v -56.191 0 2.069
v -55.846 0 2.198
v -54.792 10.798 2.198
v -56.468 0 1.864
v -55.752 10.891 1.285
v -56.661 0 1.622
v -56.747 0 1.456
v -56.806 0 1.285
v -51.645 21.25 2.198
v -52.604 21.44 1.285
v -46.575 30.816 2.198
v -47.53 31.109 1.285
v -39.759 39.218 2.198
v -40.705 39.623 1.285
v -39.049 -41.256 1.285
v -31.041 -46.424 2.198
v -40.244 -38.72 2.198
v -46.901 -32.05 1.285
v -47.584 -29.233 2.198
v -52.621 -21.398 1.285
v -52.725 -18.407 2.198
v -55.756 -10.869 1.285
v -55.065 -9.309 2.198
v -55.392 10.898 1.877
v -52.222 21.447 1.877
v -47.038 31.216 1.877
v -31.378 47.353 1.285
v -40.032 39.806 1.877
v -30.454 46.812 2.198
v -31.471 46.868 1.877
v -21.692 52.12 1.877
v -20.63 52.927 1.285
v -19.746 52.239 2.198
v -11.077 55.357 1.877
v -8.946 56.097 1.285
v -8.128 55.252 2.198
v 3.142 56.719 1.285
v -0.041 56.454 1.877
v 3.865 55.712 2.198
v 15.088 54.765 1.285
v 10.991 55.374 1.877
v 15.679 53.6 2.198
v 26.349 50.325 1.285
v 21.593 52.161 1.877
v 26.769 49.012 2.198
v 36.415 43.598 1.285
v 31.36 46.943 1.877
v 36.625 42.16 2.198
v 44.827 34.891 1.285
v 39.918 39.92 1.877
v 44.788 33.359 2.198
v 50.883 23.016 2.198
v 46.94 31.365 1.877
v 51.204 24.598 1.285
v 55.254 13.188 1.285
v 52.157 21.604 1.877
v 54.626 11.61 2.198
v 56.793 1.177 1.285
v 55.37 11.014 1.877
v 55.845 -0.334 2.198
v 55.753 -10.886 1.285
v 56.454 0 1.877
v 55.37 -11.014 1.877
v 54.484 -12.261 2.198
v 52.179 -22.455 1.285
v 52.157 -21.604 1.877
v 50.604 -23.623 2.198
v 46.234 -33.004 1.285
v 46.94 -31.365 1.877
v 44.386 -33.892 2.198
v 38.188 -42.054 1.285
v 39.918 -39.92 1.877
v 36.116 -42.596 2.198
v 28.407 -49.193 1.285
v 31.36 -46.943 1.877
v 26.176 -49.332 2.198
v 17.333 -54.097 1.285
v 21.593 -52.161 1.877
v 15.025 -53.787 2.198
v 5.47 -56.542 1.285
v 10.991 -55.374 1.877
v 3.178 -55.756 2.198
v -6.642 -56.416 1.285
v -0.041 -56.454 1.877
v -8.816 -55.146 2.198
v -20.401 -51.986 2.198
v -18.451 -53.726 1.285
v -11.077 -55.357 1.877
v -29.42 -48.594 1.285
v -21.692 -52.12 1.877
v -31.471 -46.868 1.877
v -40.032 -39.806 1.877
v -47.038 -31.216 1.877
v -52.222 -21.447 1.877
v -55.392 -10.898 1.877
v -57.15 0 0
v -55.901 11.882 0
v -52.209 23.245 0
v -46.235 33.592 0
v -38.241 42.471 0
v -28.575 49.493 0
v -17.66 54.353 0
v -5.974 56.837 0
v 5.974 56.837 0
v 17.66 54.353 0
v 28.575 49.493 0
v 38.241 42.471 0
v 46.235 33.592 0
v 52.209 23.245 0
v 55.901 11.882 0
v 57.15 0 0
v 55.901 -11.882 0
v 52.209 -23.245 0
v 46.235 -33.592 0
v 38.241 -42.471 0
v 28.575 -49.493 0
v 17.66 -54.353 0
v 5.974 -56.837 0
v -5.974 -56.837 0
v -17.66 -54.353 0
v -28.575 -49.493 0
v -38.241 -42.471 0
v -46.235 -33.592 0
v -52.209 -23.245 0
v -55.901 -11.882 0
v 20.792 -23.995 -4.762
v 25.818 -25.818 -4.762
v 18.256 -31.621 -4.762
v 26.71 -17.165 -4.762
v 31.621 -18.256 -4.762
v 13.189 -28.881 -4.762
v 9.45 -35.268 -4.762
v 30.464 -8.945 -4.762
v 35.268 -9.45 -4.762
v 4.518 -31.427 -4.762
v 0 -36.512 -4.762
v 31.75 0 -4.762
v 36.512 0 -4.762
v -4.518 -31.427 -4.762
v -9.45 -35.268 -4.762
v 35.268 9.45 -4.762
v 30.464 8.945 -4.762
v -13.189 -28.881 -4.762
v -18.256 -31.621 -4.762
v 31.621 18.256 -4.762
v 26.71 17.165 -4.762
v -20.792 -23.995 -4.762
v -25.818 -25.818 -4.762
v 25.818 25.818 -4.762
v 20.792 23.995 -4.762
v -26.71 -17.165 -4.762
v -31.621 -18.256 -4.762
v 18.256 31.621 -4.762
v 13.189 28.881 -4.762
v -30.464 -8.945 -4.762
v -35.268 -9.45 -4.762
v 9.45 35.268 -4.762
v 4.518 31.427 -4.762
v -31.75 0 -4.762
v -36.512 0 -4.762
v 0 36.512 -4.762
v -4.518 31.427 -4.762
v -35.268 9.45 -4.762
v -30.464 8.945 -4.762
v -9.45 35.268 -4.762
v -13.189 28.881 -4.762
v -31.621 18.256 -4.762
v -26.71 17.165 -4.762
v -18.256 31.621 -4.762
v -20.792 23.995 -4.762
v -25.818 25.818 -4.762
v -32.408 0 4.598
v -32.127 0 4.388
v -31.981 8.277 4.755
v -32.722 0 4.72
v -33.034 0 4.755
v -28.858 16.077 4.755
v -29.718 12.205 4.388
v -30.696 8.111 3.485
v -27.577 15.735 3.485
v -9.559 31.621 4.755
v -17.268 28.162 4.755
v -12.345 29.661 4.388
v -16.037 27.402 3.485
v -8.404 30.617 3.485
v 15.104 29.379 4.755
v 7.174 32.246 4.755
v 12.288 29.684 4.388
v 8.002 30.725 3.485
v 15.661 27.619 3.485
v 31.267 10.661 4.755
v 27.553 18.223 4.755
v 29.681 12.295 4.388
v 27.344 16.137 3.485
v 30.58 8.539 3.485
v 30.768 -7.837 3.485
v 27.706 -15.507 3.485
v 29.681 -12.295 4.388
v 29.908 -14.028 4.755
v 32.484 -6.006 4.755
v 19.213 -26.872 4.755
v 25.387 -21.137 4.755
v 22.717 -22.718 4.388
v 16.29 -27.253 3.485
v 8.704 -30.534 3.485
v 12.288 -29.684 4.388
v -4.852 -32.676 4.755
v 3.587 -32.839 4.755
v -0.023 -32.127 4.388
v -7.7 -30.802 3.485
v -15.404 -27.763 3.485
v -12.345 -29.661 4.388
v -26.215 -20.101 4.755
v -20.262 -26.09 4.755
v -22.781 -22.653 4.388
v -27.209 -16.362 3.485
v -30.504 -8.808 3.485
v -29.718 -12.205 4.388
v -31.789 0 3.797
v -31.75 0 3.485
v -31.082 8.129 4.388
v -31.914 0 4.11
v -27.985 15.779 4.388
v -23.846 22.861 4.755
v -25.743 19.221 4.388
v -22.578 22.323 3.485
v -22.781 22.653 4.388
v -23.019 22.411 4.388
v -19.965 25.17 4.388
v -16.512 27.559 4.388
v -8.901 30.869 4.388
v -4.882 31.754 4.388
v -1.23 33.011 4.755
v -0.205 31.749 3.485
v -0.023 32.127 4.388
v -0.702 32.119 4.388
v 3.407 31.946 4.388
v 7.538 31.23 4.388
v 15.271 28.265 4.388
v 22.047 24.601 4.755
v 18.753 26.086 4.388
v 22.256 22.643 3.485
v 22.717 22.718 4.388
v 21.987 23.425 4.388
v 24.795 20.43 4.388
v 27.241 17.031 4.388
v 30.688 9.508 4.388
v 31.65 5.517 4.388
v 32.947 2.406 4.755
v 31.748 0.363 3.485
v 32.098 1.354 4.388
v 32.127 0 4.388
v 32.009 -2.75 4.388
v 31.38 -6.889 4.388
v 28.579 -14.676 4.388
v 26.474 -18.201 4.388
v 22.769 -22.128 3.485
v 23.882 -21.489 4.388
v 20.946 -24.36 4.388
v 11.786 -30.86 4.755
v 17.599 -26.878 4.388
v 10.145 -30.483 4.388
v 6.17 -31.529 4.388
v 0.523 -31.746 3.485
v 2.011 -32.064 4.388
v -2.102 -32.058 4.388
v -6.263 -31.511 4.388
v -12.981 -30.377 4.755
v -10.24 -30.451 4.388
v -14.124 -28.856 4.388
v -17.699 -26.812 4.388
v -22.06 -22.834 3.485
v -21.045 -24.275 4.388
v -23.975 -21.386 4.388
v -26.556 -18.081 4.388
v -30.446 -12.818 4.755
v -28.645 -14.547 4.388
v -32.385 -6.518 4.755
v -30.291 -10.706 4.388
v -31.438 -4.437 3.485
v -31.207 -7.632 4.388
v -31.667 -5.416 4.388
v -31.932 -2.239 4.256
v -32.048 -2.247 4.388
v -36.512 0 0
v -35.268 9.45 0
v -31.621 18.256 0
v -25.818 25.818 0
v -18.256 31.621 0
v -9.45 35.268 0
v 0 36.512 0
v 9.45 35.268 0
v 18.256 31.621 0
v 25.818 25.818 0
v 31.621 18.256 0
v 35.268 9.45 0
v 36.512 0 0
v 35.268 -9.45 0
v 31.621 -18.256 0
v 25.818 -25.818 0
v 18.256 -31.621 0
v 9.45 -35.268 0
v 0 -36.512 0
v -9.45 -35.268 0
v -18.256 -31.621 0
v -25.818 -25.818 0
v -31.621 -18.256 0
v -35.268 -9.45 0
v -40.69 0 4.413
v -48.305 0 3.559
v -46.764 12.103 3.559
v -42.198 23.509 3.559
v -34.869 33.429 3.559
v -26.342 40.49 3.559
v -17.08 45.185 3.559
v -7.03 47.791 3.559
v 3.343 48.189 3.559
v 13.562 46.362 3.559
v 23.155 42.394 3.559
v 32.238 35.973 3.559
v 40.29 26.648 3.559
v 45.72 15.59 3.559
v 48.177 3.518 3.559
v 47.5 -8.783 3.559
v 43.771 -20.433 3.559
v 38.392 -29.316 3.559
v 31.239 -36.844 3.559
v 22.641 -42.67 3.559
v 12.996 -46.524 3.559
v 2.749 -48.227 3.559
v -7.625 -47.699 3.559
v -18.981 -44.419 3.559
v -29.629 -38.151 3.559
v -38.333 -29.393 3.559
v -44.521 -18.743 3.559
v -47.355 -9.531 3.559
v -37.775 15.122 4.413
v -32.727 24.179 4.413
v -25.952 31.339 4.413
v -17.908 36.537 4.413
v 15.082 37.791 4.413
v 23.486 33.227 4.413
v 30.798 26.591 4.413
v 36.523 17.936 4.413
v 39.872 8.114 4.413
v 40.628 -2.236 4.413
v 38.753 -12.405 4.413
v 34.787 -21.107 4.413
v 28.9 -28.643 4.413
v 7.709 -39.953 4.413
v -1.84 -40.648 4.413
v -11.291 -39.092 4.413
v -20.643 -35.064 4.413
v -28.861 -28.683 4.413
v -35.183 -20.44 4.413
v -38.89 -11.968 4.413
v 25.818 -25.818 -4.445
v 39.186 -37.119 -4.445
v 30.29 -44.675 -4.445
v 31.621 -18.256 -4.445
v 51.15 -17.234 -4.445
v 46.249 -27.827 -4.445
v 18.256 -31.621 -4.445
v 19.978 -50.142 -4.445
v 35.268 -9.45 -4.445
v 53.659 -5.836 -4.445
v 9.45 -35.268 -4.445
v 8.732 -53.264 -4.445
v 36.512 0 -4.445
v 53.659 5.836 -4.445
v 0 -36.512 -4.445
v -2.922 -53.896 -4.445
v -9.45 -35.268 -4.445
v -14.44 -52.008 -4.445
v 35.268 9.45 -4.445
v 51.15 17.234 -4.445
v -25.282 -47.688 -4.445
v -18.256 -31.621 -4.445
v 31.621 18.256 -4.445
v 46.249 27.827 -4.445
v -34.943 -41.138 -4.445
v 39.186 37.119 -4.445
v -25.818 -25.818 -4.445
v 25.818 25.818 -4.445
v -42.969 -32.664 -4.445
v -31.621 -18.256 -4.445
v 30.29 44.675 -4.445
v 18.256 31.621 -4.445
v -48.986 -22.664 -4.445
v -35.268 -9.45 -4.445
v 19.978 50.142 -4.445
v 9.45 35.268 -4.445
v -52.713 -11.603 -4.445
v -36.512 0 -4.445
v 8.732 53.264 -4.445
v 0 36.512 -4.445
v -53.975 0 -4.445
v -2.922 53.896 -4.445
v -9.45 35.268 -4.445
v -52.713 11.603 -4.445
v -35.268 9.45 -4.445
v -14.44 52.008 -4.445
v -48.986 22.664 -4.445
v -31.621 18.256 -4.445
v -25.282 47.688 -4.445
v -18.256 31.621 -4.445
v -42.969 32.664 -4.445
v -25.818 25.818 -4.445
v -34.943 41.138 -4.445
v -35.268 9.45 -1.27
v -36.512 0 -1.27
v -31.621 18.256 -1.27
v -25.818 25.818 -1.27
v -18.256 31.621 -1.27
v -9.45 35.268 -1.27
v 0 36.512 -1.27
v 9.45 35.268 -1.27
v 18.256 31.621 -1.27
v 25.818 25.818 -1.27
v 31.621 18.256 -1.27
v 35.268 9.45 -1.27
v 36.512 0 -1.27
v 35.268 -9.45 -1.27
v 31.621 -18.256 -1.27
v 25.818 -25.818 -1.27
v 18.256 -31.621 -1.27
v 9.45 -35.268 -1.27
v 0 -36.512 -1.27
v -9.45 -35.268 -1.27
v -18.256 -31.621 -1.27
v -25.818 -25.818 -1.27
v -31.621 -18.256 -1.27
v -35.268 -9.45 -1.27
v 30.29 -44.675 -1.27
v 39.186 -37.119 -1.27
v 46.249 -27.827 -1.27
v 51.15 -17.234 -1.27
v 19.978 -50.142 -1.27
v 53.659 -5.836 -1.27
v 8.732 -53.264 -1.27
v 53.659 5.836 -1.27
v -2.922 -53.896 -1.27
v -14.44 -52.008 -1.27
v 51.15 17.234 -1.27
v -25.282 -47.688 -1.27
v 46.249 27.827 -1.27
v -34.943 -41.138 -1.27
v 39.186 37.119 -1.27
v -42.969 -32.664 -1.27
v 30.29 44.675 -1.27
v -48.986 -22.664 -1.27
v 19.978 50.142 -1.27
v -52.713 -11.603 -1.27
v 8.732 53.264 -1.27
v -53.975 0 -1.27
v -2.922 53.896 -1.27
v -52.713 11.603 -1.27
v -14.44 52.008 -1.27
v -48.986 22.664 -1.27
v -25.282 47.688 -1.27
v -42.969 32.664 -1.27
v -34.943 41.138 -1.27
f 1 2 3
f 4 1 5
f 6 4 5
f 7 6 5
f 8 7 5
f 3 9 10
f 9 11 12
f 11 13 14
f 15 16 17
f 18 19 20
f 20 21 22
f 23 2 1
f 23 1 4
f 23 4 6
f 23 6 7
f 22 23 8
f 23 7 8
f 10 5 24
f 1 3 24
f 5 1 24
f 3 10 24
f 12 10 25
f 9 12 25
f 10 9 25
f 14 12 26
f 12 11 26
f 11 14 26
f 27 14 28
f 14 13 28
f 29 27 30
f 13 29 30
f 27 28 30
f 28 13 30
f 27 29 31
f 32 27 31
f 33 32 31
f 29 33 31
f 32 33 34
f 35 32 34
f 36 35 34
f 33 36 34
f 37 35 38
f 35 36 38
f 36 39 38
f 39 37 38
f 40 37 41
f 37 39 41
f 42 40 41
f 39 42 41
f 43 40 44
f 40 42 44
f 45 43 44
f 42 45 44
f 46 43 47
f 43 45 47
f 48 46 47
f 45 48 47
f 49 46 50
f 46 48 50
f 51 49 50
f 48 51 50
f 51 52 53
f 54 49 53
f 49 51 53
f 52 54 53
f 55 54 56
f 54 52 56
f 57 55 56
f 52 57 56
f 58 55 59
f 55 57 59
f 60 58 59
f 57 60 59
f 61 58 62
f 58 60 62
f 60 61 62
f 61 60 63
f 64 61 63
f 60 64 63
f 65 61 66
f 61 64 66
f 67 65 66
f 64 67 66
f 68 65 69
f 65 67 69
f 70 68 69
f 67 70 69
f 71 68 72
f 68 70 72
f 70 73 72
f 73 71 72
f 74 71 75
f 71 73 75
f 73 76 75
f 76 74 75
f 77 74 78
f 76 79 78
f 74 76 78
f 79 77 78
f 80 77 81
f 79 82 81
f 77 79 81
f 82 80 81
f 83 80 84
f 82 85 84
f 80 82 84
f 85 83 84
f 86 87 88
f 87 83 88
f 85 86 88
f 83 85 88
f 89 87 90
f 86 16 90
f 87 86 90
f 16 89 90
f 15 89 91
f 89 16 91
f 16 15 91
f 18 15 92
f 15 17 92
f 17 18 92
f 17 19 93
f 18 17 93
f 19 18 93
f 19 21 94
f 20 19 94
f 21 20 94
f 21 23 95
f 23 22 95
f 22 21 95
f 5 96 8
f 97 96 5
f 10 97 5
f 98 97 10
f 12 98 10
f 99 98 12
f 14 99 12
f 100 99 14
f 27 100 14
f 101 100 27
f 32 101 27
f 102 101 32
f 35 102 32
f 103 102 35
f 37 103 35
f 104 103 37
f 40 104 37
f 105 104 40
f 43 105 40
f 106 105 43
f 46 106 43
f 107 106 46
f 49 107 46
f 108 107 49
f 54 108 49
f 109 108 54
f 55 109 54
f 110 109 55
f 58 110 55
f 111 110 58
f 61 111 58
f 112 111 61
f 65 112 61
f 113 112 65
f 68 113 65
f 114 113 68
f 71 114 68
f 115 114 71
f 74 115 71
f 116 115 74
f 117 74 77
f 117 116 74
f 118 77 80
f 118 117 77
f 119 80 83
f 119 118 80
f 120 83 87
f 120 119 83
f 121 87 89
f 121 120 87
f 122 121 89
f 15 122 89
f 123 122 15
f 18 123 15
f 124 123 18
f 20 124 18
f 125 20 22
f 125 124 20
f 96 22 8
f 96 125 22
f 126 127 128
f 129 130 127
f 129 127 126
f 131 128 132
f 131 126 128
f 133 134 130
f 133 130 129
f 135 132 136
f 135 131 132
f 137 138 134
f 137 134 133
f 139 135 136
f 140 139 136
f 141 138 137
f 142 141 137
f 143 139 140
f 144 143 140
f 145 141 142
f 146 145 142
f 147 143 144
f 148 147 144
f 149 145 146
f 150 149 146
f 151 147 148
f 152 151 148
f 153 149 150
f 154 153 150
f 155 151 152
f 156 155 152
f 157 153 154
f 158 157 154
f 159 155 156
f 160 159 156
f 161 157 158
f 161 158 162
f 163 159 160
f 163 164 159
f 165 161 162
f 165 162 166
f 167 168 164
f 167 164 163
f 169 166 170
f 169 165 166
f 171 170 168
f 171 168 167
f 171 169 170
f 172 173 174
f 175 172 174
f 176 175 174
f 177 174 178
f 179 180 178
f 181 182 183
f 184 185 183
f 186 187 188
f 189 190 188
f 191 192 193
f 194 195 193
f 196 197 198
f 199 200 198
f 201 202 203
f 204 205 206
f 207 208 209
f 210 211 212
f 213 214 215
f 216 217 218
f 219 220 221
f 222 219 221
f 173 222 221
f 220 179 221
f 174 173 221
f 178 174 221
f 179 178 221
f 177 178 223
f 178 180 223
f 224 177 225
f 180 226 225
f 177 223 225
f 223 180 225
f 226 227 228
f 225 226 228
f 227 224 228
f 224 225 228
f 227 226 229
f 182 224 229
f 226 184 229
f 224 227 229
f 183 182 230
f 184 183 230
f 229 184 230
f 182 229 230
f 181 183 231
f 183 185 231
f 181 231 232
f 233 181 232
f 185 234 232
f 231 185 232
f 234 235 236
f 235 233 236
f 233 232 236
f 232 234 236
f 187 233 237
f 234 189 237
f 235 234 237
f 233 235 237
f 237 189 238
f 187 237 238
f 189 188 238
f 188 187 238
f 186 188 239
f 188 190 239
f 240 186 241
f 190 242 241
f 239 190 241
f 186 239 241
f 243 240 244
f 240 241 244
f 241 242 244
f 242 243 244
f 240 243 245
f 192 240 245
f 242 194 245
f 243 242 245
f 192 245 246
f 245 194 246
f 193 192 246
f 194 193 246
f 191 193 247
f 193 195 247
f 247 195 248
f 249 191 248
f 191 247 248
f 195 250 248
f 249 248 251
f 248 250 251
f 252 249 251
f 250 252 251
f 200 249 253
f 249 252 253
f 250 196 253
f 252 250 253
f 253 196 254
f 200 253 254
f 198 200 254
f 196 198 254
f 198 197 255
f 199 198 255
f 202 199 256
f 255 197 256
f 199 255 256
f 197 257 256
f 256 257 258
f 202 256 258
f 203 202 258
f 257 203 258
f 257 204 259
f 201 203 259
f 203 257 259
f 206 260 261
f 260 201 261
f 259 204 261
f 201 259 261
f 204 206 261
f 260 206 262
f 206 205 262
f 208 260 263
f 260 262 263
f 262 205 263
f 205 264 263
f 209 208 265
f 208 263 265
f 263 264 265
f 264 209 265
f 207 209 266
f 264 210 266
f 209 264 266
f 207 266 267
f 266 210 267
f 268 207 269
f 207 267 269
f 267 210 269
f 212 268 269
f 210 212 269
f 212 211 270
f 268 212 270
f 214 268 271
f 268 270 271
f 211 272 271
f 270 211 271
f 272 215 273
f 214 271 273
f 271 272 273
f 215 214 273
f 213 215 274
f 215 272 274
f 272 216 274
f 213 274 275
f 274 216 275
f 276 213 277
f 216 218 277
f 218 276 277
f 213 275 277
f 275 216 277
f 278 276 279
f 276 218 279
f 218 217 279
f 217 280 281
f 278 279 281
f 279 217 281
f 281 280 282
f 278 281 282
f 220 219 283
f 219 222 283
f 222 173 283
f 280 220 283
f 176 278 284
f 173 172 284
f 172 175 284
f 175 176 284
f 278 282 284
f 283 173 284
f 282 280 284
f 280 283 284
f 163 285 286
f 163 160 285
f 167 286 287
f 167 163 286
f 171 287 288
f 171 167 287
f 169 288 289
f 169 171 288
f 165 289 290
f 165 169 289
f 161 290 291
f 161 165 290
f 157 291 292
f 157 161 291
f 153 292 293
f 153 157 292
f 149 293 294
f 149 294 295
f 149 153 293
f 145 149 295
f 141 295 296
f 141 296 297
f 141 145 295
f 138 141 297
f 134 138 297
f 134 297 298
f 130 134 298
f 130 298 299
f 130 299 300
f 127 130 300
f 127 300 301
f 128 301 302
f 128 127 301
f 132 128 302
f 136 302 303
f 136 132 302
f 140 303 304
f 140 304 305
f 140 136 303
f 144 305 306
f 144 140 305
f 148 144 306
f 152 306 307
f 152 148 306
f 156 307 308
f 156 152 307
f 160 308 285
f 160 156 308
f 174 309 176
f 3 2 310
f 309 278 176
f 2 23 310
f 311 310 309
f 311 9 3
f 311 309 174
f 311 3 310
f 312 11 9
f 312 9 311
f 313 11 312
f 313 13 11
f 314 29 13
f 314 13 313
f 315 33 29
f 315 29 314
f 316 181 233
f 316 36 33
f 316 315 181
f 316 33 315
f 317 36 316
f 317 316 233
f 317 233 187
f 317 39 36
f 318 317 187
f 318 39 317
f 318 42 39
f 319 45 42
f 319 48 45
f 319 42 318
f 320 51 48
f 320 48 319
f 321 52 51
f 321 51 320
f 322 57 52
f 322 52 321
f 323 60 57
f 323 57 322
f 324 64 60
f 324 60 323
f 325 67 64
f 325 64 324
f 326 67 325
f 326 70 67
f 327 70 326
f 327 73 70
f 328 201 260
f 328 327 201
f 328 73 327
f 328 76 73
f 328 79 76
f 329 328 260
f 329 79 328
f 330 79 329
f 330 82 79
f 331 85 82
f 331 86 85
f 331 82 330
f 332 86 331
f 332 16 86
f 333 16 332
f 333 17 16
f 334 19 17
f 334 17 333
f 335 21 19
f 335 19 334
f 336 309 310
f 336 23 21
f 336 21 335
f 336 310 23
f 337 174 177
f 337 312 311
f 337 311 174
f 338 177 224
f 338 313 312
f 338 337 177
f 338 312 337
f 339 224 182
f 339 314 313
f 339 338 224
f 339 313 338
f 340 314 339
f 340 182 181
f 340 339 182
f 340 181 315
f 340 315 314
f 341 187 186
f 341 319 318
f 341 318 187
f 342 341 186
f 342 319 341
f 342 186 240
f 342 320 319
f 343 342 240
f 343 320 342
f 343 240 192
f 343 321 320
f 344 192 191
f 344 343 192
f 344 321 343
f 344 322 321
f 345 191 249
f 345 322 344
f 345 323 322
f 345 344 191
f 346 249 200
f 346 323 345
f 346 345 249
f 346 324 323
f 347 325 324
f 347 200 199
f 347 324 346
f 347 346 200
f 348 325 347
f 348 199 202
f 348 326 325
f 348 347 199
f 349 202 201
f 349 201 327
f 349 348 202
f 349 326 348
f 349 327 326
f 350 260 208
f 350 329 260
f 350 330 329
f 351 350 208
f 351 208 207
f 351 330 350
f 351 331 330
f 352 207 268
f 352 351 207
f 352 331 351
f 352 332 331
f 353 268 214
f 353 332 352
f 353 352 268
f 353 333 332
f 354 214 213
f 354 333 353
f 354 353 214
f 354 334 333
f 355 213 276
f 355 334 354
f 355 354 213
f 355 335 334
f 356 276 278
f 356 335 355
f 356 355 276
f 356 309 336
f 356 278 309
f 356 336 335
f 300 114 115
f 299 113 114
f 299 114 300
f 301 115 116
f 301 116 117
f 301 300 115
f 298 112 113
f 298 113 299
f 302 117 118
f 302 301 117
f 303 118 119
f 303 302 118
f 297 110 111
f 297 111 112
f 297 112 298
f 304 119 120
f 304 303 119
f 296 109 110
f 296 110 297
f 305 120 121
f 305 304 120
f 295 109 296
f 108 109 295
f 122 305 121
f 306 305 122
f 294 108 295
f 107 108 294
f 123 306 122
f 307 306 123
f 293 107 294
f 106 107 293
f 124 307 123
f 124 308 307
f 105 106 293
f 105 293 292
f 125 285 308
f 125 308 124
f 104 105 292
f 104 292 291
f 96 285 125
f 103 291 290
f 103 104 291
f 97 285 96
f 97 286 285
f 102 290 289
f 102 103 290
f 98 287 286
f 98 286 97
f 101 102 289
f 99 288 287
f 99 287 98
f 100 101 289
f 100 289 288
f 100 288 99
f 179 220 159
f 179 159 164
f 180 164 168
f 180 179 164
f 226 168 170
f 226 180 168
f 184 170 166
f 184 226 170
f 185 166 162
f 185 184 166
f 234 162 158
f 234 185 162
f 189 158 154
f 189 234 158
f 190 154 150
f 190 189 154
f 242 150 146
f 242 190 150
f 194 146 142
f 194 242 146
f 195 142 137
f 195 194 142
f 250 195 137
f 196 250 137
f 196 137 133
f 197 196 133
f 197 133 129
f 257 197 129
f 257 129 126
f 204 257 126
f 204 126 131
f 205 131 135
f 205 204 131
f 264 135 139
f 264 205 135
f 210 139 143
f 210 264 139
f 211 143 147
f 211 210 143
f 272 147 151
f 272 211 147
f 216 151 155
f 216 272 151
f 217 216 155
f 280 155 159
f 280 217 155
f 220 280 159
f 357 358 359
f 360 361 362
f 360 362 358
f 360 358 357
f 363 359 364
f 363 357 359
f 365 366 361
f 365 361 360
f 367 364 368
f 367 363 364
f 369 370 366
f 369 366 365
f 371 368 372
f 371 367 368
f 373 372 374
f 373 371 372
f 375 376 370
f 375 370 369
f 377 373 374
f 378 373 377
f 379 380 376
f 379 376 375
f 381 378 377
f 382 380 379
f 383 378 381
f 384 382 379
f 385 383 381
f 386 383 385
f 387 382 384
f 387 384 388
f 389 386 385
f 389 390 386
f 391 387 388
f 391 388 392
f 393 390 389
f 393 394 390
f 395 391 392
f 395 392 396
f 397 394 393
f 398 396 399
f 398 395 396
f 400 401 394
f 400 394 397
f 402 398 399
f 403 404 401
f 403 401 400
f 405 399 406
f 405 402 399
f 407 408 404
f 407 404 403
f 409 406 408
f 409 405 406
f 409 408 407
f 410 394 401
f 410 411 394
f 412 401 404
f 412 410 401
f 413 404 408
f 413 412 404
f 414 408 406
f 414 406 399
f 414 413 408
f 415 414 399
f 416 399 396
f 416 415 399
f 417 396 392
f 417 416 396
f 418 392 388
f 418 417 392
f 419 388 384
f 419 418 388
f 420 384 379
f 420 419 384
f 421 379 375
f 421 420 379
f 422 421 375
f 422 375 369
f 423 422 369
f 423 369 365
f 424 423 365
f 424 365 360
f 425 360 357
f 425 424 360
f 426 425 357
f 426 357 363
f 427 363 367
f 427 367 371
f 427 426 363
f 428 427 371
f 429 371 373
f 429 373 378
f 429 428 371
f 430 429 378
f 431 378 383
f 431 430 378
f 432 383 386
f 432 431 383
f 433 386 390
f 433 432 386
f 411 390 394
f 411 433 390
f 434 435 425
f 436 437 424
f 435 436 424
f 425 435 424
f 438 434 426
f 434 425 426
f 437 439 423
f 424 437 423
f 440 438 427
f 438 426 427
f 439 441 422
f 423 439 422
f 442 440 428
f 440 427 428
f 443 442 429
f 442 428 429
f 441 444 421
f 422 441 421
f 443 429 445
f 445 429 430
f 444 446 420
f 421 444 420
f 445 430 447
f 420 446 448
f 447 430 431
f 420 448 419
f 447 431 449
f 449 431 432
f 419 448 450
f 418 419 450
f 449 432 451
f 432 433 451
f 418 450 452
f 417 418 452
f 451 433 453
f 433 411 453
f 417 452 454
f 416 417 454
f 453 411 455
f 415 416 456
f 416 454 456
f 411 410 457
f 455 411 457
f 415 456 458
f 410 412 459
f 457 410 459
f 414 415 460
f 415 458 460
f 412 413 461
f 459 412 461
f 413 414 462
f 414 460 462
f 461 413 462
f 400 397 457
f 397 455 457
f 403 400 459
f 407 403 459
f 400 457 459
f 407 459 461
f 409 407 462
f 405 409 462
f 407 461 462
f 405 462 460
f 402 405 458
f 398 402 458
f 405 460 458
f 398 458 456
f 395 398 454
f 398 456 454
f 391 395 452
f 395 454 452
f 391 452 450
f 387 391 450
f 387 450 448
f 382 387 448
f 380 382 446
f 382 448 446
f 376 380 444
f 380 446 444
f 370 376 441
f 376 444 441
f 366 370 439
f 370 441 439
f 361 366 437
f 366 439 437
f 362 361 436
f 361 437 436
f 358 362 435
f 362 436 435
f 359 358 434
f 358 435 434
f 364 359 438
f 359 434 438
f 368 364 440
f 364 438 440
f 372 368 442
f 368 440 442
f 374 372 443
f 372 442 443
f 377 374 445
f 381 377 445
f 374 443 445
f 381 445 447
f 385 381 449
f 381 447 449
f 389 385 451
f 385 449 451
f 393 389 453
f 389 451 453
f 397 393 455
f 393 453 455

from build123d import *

# Parameters (mm, degrees)
F2_R = 1.27
F0_W = 17.4625
F0_H = 3.175


with BuildPart() as f1:
    # F0 (on Front) → F1 (revolve)
    with BuildSketch(Plane.XZ):
        with BuildLine():
            Line((-31.75, -4.7625), (-31.75, 4.7625))
            ThreePointArc((-31.75, 4.7625), (-44.252528, 4.077828), (-56.605527, 2.032))
            Line((-56.605527, 2.032), (-57.15, 0))
            Line((-57.15, 0), (-36.5125, 0))
            Line((-36.5125, 0), (-36.5125, -1.27))
            Line((-36.5125, -1.27), (-36.5125, -4.445))
            Line((-36.5125, -4.445), (-36.5125, -4.7625))
            Line((-36.5125, -4.7625), (-31.75, -4.7625))
        make_face()
    revolve(axis=Axis((0, 0, -1.44377), (0, 0, -1)))

    # F2
    f2_edges = [f1.edges().sort_by_distance(p)[0] for p in [
        (56.605527, 0, 2.032),
        (31.75, 0, 4.7625),
    ]]
    fillet(f2_edges, radius=F2_R)


with BuildPart() as f3:
    # F0 (on Front) → F3 (revolve)
    with BuildSketch(Plane.XZ):
        with Locations((-45.24375, -2.8575)):
            Rectangle(F0_W, F0_H)
    revolve(axis=Axis((0, 0, -1.44377), (0, 0, -1)))


solid = Compound([f1.part, f3.part])
